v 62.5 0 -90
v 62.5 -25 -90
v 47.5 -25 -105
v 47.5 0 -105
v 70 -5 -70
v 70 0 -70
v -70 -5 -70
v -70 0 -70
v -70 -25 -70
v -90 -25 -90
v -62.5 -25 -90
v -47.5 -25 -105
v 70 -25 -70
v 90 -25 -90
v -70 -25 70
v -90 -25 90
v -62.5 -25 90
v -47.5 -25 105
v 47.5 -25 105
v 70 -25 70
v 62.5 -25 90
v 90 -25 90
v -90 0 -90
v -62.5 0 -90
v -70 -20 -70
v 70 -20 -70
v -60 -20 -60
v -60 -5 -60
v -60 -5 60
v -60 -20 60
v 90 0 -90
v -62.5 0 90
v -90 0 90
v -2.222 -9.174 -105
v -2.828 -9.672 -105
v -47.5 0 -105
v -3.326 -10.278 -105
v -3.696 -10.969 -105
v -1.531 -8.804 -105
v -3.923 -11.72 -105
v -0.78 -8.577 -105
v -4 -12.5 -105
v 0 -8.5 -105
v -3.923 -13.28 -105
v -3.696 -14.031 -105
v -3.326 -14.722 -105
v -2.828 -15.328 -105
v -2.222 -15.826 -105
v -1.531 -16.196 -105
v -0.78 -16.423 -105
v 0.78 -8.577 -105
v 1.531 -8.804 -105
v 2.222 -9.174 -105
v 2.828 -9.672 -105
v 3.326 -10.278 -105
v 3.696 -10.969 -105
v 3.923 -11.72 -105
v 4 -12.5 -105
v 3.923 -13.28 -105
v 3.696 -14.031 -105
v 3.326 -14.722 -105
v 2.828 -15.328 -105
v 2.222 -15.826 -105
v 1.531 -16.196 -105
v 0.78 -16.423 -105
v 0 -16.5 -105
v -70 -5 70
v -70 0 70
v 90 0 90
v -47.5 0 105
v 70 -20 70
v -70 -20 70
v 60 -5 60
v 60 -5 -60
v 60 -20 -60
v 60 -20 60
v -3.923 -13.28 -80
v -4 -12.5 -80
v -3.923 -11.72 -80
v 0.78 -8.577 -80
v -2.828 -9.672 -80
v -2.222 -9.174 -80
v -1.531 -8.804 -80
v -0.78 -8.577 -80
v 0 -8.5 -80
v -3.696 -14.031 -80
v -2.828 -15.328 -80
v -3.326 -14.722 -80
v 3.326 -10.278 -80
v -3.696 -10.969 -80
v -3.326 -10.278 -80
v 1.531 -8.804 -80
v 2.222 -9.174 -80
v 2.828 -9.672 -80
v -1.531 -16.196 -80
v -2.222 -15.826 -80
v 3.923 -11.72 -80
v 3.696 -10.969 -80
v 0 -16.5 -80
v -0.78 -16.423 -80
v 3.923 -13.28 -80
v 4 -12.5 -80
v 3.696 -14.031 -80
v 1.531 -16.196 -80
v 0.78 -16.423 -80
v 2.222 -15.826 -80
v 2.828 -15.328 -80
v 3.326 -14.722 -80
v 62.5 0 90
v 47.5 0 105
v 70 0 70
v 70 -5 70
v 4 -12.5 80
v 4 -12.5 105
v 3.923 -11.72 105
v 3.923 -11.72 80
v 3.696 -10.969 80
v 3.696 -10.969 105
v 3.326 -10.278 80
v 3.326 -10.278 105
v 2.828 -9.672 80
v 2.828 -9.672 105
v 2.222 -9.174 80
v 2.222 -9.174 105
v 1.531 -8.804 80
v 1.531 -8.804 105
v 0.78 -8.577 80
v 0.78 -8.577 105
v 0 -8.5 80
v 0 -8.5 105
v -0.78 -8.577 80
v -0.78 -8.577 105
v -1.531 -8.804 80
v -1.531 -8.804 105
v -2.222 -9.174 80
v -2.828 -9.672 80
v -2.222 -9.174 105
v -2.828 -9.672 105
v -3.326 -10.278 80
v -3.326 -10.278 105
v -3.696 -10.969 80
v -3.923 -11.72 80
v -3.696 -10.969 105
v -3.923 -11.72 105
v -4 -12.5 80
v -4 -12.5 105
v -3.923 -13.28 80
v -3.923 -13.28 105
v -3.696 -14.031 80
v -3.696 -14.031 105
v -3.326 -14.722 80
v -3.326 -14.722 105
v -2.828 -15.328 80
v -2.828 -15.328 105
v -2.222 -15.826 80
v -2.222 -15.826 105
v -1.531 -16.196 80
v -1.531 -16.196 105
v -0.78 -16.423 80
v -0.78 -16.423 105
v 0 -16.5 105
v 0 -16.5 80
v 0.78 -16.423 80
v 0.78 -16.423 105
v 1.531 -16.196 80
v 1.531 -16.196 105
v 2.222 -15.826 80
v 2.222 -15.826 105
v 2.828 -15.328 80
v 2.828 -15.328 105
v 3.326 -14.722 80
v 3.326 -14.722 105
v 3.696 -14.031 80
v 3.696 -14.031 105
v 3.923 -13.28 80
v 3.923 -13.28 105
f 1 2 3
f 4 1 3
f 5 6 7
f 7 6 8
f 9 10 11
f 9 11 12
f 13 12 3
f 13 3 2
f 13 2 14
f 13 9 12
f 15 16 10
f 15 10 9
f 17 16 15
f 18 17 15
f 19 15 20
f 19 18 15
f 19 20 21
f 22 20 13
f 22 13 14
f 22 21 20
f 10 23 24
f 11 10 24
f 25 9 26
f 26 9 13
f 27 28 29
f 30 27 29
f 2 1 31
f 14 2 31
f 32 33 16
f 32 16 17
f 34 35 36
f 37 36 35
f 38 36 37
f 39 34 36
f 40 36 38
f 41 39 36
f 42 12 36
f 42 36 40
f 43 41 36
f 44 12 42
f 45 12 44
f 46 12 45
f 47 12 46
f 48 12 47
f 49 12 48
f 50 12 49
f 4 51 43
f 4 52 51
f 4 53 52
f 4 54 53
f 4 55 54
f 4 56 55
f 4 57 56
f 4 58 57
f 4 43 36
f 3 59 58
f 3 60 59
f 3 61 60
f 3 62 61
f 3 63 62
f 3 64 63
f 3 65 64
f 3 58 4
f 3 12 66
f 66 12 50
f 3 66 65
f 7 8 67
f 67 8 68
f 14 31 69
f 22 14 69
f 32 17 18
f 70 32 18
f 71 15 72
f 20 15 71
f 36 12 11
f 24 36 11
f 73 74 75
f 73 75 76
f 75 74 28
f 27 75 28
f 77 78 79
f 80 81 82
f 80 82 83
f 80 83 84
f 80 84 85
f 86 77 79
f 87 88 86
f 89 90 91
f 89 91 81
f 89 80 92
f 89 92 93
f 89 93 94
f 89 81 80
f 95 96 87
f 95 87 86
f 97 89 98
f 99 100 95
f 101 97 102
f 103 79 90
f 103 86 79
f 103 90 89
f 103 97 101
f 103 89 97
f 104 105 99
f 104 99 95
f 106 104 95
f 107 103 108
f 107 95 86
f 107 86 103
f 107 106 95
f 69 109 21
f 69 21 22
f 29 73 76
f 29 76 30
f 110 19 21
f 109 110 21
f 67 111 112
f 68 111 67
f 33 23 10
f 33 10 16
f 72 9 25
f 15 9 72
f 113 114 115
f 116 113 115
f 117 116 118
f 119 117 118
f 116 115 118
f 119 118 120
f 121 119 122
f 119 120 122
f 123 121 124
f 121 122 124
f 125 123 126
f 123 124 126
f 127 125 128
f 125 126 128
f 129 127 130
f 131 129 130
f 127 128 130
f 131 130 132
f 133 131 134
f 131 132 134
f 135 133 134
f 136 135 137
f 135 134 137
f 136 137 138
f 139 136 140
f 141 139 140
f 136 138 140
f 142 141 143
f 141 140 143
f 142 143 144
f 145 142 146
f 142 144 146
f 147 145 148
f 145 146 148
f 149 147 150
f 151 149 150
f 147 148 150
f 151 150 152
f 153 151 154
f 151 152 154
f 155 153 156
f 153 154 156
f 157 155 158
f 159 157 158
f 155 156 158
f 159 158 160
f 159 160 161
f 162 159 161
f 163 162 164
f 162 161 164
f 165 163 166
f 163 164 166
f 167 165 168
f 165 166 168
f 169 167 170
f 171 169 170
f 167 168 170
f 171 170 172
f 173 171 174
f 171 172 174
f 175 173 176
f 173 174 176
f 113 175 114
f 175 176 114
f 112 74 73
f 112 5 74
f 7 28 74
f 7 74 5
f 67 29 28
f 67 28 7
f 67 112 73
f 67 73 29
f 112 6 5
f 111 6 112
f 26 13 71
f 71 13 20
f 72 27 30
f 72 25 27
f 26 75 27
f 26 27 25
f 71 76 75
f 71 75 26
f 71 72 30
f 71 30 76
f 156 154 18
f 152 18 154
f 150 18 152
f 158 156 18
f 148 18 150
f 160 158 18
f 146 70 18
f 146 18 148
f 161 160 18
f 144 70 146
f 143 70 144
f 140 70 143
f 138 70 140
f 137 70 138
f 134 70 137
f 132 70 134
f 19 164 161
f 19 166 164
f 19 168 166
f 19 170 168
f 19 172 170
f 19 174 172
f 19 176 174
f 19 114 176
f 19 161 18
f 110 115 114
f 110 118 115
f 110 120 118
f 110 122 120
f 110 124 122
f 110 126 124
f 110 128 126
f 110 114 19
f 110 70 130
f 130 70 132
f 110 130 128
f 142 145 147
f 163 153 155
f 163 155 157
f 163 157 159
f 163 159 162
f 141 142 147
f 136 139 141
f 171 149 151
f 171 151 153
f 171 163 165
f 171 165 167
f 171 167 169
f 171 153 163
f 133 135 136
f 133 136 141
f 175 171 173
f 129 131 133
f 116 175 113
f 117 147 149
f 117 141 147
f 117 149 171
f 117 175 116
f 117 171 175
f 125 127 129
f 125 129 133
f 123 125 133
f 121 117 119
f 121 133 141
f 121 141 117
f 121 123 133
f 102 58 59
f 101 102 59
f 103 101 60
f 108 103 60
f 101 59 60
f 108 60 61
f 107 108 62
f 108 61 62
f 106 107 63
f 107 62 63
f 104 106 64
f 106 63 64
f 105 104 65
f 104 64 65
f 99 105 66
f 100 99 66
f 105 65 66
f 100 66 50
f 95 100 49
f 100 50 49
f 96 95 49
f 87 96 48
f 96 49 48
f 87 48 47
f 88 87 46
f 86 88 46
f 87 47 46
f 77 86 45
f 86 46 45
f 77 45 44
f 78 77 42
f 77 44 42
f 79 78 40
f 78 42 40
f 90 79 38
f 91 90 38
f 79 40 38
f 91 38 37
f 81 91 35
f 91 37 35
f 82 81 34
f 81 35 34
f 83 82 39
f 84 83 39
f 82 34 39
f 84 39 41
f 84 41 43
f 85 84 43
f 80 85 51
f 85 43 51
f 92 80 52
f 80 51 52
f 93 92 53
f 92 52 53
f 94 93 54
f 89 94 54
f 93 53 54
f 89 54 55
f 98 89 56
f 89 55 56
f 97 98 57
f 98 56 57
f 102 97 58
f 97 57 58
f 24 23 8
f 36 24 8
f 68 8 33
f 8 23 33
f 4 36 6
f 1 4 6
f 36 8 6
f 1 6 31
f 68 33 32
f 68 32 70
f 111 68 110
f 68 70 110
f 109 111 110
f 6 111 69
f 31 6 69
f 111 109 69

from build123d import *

# Parameters (mm, degrees)
F0_W      = 180
F0_H      = 180
F1_DEPTH  = 25
F2_W      = 125
F2_H      = 25
F3_DEPTH  = 15
F4_W      = 125
F4_H      = 25
F5_DEPTH  = 15
F7_DEPTH  = 25
F8_W      = 120
F8_H      = 120
F9_DEPTH  = 25
F10_W     = 140
F10_H     = 140
F11_DEPTH = 5
F12_W     = 140
F12_H     = 140
F13_DEPTH = 5
F14_R     = 4
F15_DEPTH = 25
F16_R     = 4
F17_DEPTH = 25


with BuildPart() as f1:
    # F0 (on Front) → F1 (new body)
    with BuildSketch(Plane.XZ):
        Rectangle(F0_W, F0_H)
    extrude(amount=F1_DEPTH)

    # F2 (on face) → F3 (join)
    with BuildSketch(Plane(origin=(0, 0, -90), x_dir=(1, 0, 0), z_dir=(0, 0, -1))):
        with Locations((0, 12.5)):
            Rectangle(F2_W, F2_H)
    extrude(amount=F3_DEPTH)

    # F4 (on face) → F5 (join)
    with BuildSketch(Plane.XY.offset(90)):
        with Locations((0, -12.5)):
            Rectangle(F4_W, F4_H)
    extrude(amount=F5_DEPTH)

    # F6 (on face) → F7 (cut)
    with BuildSketch(Plane.XZ.offset(25)):
        Polygon((-47.5, -105), (-62.5, -90), (-62.5, -105), align=None)
        Polygon((62.5, -105), (62.5, -90), (47.5, -105), align=None)
        Polygon((-62.5, 105), (-62.5, 90), (-47.5, 105), align=None)
        Polygon((47.5, 105), (62.5, 90), (62.5, 105), align=None)
    extrude(amount=-F7_DEPTH, mode=Mode.SUBTRACT)

    # F8 (on face) → F9 (cut)
    with BuildSketch(Plane(origin=(0, 0, 0), x_dir=(-1, 0, 0), z_dir=(0, 1, 0))):
        Rectangle(F8_W, F8_H)
    extrude(amount=-F9_DEPTH, mode=Mode.SUBTRACT)

    # F10 (on face) → F11 (cut)
    with BuildSketch(Plane(origin=(0, 0, 0), x_dir=(-1, 0, 0), z_dir=(0, 1, 0))):
        Rectangle(F10_W, F10_H)
    extrude(amount=-F11_DEPTH, mode=Mode.SUBTRACT)

    # F12 (on face) → F13 (cut)
    with BuildSketch(Plane.XZ.offset(25)):
        Rectangle(F12_W, F12_H)
    extrude(amount=-F13_DEPTH, mode=Mode.SUBTRACT)

    # F14 (on face) → F15 (cut)
    with BuildSketch(Plane(origin=(0, 0, -105), x_dir=(1, 0, 0), z_dir=(0, 0, -1))):
        with Locations((0, 12.5)):
            Circle(F14_R)
    extrude(amount=-F15_DEPTH, mode=Mode.SUBTRACT)

    # F16 (on face) → F17 (cut)
    with BuildSketch(Plane.XY.offset(105)):
        with Locations((0, -12.5)):
            Circle(F16_R)
    extrude(amount=-F17_DEPTH, mode=Mode.SUBTRACT)


solid = f1.part
